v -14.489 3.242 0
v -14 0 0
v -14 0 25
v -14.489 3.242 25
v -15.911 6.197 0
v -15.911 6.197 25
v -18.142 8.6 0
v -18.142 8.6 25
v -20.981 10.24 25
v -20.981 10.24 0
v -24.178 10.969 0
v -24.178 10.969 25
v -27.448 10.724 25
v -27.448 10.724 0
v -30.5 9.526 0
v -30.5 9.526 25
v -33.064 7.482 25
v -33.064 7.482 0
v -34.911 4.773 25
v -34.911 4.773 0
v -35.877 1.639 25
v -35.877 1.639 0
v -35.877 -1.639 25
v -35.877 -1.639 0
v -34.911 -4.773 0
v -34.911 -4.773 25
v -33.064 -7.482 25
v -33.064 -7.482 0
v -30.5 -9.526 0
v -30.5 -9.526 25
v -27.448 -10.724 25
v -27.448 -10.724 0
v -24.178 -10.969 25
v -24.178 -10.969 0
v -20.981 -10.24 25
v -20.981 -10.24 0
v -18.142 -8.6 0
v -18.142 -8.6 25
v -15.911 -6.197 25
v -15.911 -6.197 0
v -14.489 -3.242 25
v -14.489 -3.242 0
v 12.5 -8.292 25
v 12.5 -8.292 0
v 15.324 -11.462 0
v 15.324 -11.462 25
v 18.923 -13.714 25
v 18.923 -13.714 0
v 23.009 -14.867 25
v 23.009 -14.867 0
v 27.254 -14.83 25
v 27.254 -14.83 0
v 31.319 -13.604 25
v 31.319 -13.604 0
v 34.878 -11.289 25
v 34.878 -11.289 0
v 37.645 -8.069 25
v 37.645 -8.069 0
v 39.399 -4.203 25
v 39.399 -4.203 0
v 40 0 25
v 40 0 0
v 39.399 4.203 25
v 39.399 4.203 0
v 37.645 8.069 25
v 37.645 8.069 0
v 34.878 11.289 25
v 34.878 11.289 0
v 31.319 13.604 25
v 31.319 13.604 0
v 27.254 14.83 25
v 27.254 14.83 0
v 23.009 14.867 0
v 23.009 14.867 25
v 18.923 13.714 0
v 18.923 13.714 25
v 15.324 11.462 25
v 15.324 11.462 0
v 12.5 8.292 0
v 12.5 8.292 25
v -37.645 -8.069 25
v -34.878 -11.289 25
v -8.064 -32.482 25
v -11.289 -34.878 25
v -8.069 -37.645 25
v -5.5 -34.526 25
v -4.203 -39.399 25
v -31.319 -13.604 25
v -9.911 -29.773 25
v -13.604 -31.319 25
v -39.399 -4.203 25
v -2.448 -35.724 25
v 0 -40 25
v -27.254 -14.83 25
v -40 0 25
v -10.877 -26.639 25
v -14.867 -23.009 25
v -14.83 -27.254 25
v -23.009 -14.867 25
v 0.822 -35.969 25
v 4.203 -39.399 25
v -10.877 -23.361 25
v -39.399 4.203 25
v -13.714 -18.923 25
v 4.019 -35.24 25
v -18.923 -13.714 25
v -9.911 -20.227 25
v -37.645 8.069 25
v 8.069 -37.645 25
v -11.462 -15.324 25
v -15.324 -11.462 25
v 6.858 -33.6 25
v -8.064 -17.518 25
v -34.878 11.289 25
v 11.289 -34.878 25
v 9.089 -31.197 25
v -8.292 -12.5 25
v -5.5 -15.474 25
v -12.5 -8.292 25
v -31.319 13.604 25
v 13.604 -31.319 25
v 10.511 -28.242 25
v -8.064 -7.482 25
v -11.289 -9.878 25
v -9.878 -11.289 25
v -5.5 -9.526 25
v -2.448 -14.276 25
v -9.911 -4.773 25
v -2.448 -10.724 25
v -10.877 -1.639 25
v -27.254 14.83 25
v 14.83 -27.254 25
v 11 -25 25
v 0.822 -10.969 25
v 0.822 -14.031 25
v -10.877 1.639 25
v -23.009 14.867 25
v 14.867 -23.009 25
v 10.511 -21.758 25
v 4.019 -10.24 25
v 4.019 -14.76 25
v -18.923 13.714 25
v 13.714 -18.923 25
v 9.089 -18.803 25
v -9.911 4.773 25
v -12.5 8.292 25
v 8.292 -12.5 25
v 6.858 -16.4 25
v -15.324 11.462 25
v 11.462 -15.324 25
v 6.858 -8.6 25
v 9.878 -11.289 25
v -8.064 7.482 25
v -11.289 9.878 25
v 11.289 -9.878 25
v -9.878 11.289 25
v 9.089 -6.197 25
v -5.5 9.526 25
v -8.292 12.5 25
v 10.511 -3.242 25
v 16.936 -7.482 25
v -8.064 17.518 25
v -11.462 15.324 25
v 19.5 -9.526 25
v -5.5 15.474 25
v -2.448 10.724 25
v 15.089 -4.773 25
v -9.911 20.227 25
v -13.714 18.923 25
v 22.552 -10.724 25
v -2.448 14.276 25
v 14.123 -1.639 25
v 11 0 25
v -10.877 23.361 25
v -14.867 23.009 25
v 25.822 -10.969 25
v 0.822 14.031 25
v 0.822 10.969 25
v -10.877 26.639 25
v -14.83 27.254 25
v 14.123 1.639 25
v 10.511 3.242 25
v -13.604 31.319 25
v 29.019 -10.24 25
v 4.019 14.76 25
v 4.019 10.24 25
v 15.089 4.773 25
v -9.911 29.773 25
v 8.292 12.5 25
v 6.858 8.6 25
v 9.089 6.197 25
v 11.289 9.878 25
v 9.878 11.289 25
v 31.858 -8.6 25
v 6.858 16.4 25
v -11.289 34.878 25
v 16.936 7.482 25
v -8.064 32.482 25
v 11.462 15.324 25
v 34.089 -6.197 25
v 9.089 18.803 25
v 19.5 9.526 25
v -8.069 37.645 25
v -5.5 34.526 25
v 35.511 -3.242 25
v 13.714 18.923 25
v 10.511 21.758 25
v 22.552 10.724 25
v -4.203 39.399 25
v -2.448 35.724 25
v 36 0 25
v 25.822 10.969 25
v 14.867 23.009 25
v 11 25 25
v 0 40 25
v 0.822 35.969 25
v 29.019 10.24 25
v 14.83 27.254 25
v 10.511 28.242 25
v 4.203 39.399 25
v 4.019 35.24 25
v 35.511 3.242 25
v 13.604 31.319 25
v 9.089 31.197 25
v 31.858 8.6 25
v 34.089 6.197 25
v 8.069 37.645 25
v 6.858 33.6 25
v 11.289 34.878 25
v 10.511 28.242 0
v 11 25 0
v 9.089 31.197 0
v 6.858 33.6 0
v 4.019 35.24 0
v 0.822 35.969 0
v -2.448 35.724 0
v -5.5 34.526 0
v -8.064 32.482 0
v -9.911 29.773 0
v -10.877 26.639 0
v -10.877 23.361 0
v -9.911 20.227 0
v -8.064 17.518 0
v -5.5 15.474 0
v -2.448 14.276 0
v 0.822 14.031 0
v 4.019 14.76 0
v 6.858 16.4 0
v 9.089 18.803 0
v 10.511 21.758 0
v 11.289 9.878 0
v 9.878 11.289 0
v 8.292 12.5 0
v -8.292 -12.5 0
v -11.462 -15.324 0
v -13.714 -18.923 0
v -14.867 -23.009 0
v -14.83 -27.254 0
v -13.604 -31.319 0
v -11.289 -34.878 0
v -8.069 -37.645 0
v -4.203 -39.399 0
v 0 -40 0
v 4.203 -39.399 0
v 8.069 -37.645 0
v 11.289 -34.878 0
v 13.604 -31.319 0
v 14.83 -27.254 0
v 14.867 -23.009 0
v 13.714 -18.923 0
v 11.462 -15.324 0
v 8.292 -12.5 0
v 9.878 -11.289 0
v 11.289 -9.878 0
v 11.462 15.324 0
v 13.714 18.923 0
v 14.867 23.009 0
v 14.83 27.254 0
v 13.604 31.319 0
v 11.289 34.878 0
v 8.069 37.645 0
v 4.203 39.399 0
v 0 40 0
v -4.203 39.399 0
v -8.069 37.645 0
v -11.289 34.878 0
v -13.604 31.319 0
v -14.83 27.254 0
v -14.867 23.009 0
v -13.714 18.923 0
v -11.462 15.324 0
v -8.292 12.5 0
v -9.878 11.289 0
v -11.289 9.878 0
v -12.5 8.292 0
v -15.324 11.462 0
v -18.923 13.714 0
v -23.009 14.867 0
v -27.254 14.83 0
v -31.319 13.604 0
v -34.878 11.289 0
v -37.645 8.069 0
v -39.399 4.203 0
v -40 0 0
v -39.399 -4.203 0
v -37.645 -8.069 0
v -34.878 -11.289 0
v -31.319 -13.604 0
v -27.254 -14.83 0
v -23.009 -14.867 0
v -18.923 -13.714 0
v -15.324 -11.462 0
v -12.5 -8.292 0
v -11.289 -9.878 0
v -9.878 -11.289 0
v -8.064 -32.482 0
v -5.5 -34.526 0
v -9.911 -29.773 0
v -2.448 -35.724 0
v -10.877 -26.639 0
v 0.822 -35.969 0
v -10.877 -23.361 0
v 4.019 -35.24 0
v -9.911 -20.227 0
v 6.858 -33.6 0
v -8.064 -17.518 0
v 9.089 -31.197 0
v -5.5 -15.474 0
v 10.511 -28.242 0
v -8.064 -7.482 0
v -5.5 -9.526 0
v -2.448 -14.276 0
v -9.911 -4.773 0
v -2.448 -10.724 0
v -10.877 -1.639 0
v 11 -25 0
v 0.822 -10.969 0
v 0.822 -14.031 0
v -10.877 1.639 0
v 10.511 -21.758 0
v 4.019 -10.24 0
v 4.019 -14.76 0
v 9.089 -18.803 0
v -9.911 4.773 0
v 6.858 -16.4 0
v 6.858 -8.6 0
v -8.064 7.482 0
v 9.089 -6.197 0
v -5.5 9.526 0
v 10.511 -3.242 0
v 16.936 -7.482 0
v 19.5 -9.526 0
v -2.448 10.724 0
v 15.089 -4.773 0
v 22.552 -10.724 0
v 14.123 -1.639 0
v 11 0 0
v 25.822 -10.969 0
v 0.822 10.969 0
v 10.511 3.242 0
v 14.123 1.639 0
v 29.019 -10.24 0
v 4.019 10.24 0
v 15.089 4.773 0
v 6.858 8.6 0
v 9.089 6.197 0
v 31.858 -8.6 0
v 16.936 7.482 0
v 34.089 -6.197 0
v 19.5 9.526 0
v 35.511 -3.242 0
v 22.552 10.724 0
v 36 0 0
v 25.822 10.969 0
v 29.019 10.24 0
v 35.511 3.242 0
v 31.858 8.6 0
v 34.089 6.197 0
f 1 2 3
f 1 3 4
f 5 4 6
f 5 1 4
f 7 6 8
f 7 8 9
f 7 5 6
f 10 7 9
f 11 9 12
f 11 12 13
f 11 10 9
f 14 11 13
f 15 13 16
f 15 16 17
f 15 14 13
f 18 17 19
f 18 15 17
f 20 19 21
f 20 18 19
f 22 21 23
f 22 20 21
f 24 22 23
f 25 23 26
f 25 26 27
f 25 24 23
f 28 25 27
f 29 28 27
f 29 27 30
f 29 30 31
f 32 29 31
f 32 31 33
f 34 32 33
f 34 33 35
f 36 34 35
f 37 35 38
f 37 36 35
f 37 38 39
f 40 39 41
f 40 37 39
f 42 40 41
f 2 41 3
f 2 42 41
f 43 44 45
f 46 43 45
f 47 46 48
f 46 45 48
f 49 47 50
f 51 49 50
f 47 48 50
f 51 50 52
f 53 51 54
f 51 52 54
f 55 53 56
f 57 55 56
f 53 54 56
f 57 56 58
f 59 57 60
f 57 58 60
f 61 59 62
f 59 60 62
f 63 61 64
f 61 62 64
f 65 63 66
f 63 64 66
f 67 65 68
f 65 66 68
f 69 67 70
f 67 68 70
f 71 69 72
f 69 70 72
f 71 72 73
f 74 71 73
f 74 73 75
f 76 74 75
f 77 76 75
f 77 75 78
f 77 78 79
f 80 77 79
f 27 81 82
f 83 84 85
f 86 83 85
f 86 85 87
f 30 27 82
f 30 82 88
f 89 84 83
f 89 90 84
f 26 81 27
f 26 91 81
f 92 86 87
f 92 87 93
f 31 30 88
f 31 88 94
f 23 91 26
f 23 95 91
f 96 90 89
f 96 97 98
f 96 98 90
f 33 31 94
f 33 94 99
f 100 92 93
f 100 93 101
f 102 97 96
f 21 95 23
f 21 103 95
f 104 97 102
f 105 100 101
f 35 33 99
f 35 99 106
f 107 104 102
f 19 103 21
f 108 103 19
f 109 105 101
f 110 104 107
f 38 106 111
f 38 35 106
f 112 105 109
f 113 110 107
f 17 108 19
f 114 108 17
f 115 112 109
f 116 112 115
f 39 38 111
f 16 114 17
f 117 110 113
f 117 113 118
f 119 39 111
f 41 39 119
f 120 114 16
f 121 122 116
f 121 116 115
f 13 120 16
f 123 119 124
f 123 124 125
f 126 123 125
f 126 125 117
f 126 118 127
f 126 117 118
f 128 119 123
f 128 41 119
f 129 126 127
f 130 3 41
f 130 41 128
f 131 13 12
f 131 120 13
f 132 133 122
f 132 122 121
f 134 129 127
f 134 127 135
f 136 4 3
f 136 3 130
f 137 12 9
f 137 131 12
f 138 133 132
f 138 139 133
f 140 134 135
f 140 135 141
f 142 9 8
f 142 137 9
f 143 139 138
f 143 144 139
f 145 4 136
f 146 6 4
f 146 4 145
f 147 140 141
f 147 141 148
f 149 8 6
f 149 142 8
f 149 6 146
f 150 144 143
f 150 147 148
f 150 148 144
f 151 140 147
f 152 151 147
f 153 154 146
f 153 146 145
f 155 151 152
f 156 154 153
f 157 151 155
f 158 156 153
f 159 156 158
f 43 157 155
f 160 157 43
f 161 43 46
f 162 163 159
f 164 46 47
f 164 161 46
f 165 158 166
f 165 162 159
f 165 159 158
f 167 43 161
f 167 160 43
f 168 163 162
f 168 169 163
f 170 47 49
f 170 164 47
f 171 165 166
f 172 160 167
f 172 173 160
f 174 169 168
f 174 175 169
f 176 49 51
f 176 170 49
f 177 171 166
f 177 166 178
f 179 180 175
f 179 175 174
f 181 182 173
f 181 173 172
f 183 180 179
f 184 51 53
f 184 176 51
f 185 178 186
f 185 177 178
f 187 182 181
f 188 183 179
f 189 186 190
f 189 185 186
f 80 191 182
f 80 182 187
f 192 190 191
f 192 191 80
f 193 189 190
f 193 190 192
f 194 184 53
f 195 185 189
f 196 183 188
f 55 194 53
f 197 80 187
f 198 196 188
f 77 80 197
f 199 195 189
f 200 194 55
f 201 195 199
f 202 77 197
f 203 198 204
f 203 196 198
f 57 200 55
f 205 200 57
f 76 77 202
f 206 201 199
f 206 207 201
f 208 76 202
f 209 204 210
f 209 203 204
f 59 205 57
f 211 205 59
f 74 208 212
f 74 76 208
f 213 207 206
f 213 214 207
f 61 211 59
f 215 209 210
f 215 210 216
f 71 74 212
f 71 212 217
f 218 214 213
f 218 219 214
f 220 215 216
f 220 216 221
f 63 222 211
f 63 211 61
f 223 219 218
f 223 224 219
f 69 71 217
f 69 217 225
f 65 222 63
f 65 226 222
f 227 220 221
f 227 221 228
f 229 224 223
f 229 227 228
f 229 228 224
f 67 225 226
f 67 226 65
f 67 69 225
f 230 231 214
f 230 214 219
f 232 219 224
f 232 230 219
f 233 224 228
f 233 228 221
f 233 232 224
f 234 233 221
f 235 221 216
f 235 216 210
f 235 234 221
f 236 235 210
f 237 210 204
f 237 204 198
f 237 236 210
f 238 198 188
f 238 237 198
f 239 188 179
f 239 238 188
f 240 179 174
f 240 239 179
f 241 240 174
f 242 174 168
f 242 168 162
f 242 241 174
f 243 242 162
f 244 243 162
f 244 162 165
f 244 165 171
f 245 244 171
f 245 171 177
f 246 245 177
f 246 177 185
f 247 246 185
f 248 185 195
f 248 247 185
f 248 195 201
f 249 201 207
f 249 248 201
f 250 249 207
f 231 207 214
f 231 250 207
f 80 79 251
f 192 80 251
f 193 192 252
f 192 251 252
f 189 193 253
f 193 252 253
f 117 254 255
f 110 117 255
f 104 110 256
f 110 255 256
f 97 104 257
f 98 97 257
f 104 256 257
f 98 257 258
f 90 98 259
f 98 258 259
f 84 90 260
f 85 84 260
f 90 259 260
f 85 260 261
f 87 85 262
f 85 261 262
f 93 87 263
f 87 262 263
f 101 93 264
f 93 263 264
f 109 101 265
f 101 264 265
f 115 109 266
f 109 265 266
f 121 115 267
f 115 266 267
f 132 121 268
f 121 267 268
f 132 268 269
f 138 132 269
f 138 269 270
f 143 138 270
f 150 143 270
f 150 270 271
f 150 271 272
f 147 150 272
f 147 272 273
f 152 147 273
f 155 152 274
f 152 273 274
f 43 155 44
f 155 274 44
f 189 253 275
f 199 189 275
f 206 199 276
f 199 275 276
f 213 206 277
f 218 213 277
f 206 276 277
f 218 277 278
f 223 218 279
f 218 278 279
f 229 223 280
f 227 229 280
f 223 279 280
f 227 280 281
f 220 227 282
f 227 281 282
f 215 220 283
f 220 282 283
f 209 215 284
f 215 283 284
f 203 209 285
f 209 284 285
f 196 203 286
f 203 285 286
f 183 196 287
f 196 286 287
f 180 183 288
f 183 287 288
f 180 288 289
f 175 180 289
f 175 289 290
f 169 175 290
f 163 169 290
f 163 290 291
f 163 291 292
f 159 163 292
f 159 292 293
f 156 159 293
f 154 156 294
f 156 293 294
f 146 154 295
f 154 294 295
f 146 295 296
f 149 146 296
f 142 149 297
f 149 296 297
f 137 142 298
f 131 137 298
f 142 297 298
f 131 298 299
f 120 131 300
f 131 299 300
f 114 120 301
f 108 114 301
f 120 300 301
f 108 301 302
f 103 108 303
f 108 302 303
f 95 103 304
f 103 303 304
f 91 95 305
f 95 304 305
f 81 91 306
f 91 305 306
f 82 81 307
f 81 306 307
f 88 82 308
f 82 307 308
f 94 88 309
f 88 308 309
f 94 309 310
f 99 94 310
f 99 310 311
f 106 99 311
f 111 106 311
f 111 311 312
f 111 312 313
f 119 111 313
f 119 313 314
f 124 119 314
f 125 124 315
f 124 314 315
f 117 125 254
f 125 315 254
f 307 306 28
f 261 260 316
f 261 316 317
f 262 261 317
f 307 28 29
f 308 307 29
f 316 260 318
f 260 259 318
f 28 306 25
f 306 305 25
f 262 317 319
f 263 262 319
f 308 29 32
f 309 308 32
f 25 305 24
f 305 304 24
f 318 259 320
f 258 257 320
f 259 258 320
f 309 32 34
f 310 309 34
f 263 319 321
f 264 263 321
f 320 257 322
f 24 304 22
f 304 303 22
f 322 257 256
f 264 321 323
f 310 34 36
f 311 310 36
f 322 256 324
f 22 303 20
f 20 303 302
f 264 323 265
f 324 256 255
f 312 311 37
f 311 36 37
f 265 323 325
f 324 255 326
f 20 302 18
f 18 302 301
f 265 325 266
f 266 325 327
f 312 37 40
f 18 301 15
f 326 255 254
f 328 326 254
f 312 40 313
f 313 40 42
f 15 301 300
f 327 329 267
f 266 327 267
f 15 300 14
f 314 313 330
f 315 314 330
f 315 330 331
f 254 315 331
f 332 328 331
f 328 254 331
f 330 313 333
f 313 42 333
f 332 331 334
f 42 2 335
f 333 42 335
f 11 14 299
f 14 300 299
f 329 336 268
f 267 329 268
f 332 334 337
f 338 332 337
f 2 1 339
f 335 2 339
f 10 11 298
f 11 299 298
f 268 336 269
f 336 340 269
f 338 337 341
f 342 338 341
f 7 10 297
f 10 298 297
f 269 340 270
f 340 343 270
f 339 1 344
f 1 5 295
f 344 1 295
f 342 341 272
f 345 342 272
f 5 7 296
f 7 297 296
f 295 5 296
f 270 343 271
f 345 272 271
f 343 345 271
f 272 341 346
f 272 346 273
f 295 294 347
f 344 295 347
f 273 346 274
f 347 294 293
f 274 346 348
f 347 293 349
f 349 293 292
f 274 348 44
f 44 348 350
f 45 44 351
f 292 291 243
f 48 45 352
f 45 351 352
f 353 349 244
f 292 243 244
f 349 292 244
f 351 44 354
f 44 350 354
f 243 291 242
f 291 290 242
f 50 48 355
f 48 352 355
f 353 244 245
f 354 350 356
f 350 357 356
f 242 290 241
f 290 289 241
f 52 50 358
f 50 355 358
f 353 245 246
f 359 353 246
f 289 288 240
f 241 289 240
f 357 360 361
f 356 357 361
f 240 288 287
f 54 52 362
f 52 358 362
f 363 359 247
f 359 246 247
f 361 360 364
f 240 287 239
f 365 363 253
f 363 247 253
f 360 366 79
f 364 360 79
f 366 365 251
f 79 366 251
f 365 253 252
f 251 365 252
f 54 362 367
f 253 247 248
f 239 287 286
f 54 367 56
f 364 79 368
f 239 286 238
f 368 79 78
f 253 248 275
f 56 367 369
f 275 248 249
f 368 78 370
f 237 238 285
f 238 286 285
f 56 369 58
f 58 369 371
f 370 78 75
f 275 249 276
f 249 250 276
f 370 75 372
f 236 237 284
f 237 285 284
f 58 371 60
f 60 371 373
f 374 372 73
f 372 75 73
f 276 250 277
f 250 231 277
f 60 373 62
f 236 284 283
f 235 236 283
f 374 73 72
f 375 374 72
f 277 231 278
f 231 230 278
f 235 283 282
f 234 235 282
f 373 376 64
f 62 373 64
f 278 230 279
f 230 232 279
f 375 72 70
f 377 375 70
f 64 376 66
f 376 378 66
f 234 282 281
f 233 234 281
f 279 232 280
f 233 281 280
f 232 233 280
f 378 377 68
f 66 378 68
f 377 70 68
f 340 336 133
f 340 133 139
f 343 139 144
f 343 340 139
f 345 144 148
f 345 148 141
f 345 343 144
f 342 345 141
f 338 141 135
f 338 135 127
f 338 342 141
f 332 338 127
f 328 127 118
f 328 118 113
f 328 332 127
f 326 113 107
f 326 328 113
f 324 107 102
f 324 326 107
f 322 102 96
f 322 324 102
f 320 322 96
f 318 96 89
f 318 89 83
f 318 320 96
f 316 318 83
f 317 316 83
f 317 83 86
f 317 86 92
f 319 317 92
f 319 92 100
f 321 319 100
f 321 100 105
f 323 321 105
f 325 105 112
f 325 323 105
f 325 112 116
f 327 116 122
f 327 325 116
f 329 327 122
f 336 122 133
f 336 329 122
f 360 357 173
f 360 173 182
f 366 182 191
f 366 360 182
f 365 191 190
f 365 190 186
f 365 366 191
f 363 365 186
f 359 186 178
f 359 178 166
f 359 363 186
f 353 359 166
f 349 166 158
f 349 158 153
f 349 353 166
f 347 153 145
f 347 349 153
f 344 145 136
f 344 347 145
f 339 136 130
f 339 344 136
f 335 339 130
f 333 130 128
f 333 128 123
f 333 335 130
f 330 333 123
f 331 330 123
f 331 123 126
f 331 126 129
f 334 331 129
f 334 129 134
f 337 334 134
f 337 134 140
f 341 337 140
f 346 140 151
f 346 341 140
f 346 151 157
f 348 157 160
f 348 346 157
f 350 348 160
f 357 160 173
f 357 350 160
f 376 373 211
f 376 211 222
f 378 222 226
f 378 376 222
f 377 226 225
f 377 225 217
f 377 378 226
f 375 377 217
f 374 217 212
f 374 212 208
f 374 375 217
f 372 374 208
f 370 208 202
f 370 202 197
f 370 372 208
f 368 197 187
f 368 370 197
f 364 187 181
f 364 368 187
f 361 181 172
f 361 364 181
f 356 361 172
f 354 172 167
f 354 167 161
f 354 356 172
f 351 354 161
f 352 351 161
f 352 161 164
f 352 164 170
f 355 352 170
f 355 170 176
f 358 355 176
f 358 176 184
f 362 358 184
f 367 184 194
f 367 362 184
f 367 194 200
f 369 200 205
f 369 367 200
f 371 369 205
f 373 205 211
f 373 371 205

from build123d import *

# Parameters (mm, degrees)
F0_R     = 11
F1_DEPTH = 25


with BuildPart() as f1:
    # F0 (on Top) → F1 (new body)
    with BuildSketch(Plane.XY):
        with BuildLine():
            ThreePointArc((12.5, -8.291562), (40, 0), (12.5, 8.291562))
            ThreePointArc((12.5, 8.291562), (10.606602, 10.606602), (8.291562, 12.5))
            ThreePointArc((8.291562, 12.5), (0, 40), (-8.291562, 12.5))
            ThreePointArc((-8.291562, 12.5), (-10.606602, 10.606602), (-12.5, 8.291562))
            ThreePointArc((-12.5, 8.291562), (-40, 0), (-12.5, -8.291562))
            ThreePointArc((-12.5, -8.291562), (-10.606602, -10.606602), (-8.291562, -12.5))
            ThreePointArc((-8.291562, -12.5), (0, -40), (8.291562, -12.5))
            ThreePointArc((8.291562, -12.5), (10.606602, -10.606602), (12.5, -8.291562))
        make_face()
        with Locations((0, -25)):
            Circle(F0_R, mode=Mode.SUBTRACT)
        with Locations((-25, 0)):
            Circle(F0_R, mode=Mode.SUBTRACT)
        Circle(F0_R, mode=Mode.SUBTRACT)
        with Locations((25, 0)):
            Circle(F0_R, mode=Mode.SUBTRACT)
        with Locations((0, 25)):
            Circle(F0_R, mode=Mode.SUBTRACT)
    extrude(amount=F1_DEPTH)


solid = f1.part
